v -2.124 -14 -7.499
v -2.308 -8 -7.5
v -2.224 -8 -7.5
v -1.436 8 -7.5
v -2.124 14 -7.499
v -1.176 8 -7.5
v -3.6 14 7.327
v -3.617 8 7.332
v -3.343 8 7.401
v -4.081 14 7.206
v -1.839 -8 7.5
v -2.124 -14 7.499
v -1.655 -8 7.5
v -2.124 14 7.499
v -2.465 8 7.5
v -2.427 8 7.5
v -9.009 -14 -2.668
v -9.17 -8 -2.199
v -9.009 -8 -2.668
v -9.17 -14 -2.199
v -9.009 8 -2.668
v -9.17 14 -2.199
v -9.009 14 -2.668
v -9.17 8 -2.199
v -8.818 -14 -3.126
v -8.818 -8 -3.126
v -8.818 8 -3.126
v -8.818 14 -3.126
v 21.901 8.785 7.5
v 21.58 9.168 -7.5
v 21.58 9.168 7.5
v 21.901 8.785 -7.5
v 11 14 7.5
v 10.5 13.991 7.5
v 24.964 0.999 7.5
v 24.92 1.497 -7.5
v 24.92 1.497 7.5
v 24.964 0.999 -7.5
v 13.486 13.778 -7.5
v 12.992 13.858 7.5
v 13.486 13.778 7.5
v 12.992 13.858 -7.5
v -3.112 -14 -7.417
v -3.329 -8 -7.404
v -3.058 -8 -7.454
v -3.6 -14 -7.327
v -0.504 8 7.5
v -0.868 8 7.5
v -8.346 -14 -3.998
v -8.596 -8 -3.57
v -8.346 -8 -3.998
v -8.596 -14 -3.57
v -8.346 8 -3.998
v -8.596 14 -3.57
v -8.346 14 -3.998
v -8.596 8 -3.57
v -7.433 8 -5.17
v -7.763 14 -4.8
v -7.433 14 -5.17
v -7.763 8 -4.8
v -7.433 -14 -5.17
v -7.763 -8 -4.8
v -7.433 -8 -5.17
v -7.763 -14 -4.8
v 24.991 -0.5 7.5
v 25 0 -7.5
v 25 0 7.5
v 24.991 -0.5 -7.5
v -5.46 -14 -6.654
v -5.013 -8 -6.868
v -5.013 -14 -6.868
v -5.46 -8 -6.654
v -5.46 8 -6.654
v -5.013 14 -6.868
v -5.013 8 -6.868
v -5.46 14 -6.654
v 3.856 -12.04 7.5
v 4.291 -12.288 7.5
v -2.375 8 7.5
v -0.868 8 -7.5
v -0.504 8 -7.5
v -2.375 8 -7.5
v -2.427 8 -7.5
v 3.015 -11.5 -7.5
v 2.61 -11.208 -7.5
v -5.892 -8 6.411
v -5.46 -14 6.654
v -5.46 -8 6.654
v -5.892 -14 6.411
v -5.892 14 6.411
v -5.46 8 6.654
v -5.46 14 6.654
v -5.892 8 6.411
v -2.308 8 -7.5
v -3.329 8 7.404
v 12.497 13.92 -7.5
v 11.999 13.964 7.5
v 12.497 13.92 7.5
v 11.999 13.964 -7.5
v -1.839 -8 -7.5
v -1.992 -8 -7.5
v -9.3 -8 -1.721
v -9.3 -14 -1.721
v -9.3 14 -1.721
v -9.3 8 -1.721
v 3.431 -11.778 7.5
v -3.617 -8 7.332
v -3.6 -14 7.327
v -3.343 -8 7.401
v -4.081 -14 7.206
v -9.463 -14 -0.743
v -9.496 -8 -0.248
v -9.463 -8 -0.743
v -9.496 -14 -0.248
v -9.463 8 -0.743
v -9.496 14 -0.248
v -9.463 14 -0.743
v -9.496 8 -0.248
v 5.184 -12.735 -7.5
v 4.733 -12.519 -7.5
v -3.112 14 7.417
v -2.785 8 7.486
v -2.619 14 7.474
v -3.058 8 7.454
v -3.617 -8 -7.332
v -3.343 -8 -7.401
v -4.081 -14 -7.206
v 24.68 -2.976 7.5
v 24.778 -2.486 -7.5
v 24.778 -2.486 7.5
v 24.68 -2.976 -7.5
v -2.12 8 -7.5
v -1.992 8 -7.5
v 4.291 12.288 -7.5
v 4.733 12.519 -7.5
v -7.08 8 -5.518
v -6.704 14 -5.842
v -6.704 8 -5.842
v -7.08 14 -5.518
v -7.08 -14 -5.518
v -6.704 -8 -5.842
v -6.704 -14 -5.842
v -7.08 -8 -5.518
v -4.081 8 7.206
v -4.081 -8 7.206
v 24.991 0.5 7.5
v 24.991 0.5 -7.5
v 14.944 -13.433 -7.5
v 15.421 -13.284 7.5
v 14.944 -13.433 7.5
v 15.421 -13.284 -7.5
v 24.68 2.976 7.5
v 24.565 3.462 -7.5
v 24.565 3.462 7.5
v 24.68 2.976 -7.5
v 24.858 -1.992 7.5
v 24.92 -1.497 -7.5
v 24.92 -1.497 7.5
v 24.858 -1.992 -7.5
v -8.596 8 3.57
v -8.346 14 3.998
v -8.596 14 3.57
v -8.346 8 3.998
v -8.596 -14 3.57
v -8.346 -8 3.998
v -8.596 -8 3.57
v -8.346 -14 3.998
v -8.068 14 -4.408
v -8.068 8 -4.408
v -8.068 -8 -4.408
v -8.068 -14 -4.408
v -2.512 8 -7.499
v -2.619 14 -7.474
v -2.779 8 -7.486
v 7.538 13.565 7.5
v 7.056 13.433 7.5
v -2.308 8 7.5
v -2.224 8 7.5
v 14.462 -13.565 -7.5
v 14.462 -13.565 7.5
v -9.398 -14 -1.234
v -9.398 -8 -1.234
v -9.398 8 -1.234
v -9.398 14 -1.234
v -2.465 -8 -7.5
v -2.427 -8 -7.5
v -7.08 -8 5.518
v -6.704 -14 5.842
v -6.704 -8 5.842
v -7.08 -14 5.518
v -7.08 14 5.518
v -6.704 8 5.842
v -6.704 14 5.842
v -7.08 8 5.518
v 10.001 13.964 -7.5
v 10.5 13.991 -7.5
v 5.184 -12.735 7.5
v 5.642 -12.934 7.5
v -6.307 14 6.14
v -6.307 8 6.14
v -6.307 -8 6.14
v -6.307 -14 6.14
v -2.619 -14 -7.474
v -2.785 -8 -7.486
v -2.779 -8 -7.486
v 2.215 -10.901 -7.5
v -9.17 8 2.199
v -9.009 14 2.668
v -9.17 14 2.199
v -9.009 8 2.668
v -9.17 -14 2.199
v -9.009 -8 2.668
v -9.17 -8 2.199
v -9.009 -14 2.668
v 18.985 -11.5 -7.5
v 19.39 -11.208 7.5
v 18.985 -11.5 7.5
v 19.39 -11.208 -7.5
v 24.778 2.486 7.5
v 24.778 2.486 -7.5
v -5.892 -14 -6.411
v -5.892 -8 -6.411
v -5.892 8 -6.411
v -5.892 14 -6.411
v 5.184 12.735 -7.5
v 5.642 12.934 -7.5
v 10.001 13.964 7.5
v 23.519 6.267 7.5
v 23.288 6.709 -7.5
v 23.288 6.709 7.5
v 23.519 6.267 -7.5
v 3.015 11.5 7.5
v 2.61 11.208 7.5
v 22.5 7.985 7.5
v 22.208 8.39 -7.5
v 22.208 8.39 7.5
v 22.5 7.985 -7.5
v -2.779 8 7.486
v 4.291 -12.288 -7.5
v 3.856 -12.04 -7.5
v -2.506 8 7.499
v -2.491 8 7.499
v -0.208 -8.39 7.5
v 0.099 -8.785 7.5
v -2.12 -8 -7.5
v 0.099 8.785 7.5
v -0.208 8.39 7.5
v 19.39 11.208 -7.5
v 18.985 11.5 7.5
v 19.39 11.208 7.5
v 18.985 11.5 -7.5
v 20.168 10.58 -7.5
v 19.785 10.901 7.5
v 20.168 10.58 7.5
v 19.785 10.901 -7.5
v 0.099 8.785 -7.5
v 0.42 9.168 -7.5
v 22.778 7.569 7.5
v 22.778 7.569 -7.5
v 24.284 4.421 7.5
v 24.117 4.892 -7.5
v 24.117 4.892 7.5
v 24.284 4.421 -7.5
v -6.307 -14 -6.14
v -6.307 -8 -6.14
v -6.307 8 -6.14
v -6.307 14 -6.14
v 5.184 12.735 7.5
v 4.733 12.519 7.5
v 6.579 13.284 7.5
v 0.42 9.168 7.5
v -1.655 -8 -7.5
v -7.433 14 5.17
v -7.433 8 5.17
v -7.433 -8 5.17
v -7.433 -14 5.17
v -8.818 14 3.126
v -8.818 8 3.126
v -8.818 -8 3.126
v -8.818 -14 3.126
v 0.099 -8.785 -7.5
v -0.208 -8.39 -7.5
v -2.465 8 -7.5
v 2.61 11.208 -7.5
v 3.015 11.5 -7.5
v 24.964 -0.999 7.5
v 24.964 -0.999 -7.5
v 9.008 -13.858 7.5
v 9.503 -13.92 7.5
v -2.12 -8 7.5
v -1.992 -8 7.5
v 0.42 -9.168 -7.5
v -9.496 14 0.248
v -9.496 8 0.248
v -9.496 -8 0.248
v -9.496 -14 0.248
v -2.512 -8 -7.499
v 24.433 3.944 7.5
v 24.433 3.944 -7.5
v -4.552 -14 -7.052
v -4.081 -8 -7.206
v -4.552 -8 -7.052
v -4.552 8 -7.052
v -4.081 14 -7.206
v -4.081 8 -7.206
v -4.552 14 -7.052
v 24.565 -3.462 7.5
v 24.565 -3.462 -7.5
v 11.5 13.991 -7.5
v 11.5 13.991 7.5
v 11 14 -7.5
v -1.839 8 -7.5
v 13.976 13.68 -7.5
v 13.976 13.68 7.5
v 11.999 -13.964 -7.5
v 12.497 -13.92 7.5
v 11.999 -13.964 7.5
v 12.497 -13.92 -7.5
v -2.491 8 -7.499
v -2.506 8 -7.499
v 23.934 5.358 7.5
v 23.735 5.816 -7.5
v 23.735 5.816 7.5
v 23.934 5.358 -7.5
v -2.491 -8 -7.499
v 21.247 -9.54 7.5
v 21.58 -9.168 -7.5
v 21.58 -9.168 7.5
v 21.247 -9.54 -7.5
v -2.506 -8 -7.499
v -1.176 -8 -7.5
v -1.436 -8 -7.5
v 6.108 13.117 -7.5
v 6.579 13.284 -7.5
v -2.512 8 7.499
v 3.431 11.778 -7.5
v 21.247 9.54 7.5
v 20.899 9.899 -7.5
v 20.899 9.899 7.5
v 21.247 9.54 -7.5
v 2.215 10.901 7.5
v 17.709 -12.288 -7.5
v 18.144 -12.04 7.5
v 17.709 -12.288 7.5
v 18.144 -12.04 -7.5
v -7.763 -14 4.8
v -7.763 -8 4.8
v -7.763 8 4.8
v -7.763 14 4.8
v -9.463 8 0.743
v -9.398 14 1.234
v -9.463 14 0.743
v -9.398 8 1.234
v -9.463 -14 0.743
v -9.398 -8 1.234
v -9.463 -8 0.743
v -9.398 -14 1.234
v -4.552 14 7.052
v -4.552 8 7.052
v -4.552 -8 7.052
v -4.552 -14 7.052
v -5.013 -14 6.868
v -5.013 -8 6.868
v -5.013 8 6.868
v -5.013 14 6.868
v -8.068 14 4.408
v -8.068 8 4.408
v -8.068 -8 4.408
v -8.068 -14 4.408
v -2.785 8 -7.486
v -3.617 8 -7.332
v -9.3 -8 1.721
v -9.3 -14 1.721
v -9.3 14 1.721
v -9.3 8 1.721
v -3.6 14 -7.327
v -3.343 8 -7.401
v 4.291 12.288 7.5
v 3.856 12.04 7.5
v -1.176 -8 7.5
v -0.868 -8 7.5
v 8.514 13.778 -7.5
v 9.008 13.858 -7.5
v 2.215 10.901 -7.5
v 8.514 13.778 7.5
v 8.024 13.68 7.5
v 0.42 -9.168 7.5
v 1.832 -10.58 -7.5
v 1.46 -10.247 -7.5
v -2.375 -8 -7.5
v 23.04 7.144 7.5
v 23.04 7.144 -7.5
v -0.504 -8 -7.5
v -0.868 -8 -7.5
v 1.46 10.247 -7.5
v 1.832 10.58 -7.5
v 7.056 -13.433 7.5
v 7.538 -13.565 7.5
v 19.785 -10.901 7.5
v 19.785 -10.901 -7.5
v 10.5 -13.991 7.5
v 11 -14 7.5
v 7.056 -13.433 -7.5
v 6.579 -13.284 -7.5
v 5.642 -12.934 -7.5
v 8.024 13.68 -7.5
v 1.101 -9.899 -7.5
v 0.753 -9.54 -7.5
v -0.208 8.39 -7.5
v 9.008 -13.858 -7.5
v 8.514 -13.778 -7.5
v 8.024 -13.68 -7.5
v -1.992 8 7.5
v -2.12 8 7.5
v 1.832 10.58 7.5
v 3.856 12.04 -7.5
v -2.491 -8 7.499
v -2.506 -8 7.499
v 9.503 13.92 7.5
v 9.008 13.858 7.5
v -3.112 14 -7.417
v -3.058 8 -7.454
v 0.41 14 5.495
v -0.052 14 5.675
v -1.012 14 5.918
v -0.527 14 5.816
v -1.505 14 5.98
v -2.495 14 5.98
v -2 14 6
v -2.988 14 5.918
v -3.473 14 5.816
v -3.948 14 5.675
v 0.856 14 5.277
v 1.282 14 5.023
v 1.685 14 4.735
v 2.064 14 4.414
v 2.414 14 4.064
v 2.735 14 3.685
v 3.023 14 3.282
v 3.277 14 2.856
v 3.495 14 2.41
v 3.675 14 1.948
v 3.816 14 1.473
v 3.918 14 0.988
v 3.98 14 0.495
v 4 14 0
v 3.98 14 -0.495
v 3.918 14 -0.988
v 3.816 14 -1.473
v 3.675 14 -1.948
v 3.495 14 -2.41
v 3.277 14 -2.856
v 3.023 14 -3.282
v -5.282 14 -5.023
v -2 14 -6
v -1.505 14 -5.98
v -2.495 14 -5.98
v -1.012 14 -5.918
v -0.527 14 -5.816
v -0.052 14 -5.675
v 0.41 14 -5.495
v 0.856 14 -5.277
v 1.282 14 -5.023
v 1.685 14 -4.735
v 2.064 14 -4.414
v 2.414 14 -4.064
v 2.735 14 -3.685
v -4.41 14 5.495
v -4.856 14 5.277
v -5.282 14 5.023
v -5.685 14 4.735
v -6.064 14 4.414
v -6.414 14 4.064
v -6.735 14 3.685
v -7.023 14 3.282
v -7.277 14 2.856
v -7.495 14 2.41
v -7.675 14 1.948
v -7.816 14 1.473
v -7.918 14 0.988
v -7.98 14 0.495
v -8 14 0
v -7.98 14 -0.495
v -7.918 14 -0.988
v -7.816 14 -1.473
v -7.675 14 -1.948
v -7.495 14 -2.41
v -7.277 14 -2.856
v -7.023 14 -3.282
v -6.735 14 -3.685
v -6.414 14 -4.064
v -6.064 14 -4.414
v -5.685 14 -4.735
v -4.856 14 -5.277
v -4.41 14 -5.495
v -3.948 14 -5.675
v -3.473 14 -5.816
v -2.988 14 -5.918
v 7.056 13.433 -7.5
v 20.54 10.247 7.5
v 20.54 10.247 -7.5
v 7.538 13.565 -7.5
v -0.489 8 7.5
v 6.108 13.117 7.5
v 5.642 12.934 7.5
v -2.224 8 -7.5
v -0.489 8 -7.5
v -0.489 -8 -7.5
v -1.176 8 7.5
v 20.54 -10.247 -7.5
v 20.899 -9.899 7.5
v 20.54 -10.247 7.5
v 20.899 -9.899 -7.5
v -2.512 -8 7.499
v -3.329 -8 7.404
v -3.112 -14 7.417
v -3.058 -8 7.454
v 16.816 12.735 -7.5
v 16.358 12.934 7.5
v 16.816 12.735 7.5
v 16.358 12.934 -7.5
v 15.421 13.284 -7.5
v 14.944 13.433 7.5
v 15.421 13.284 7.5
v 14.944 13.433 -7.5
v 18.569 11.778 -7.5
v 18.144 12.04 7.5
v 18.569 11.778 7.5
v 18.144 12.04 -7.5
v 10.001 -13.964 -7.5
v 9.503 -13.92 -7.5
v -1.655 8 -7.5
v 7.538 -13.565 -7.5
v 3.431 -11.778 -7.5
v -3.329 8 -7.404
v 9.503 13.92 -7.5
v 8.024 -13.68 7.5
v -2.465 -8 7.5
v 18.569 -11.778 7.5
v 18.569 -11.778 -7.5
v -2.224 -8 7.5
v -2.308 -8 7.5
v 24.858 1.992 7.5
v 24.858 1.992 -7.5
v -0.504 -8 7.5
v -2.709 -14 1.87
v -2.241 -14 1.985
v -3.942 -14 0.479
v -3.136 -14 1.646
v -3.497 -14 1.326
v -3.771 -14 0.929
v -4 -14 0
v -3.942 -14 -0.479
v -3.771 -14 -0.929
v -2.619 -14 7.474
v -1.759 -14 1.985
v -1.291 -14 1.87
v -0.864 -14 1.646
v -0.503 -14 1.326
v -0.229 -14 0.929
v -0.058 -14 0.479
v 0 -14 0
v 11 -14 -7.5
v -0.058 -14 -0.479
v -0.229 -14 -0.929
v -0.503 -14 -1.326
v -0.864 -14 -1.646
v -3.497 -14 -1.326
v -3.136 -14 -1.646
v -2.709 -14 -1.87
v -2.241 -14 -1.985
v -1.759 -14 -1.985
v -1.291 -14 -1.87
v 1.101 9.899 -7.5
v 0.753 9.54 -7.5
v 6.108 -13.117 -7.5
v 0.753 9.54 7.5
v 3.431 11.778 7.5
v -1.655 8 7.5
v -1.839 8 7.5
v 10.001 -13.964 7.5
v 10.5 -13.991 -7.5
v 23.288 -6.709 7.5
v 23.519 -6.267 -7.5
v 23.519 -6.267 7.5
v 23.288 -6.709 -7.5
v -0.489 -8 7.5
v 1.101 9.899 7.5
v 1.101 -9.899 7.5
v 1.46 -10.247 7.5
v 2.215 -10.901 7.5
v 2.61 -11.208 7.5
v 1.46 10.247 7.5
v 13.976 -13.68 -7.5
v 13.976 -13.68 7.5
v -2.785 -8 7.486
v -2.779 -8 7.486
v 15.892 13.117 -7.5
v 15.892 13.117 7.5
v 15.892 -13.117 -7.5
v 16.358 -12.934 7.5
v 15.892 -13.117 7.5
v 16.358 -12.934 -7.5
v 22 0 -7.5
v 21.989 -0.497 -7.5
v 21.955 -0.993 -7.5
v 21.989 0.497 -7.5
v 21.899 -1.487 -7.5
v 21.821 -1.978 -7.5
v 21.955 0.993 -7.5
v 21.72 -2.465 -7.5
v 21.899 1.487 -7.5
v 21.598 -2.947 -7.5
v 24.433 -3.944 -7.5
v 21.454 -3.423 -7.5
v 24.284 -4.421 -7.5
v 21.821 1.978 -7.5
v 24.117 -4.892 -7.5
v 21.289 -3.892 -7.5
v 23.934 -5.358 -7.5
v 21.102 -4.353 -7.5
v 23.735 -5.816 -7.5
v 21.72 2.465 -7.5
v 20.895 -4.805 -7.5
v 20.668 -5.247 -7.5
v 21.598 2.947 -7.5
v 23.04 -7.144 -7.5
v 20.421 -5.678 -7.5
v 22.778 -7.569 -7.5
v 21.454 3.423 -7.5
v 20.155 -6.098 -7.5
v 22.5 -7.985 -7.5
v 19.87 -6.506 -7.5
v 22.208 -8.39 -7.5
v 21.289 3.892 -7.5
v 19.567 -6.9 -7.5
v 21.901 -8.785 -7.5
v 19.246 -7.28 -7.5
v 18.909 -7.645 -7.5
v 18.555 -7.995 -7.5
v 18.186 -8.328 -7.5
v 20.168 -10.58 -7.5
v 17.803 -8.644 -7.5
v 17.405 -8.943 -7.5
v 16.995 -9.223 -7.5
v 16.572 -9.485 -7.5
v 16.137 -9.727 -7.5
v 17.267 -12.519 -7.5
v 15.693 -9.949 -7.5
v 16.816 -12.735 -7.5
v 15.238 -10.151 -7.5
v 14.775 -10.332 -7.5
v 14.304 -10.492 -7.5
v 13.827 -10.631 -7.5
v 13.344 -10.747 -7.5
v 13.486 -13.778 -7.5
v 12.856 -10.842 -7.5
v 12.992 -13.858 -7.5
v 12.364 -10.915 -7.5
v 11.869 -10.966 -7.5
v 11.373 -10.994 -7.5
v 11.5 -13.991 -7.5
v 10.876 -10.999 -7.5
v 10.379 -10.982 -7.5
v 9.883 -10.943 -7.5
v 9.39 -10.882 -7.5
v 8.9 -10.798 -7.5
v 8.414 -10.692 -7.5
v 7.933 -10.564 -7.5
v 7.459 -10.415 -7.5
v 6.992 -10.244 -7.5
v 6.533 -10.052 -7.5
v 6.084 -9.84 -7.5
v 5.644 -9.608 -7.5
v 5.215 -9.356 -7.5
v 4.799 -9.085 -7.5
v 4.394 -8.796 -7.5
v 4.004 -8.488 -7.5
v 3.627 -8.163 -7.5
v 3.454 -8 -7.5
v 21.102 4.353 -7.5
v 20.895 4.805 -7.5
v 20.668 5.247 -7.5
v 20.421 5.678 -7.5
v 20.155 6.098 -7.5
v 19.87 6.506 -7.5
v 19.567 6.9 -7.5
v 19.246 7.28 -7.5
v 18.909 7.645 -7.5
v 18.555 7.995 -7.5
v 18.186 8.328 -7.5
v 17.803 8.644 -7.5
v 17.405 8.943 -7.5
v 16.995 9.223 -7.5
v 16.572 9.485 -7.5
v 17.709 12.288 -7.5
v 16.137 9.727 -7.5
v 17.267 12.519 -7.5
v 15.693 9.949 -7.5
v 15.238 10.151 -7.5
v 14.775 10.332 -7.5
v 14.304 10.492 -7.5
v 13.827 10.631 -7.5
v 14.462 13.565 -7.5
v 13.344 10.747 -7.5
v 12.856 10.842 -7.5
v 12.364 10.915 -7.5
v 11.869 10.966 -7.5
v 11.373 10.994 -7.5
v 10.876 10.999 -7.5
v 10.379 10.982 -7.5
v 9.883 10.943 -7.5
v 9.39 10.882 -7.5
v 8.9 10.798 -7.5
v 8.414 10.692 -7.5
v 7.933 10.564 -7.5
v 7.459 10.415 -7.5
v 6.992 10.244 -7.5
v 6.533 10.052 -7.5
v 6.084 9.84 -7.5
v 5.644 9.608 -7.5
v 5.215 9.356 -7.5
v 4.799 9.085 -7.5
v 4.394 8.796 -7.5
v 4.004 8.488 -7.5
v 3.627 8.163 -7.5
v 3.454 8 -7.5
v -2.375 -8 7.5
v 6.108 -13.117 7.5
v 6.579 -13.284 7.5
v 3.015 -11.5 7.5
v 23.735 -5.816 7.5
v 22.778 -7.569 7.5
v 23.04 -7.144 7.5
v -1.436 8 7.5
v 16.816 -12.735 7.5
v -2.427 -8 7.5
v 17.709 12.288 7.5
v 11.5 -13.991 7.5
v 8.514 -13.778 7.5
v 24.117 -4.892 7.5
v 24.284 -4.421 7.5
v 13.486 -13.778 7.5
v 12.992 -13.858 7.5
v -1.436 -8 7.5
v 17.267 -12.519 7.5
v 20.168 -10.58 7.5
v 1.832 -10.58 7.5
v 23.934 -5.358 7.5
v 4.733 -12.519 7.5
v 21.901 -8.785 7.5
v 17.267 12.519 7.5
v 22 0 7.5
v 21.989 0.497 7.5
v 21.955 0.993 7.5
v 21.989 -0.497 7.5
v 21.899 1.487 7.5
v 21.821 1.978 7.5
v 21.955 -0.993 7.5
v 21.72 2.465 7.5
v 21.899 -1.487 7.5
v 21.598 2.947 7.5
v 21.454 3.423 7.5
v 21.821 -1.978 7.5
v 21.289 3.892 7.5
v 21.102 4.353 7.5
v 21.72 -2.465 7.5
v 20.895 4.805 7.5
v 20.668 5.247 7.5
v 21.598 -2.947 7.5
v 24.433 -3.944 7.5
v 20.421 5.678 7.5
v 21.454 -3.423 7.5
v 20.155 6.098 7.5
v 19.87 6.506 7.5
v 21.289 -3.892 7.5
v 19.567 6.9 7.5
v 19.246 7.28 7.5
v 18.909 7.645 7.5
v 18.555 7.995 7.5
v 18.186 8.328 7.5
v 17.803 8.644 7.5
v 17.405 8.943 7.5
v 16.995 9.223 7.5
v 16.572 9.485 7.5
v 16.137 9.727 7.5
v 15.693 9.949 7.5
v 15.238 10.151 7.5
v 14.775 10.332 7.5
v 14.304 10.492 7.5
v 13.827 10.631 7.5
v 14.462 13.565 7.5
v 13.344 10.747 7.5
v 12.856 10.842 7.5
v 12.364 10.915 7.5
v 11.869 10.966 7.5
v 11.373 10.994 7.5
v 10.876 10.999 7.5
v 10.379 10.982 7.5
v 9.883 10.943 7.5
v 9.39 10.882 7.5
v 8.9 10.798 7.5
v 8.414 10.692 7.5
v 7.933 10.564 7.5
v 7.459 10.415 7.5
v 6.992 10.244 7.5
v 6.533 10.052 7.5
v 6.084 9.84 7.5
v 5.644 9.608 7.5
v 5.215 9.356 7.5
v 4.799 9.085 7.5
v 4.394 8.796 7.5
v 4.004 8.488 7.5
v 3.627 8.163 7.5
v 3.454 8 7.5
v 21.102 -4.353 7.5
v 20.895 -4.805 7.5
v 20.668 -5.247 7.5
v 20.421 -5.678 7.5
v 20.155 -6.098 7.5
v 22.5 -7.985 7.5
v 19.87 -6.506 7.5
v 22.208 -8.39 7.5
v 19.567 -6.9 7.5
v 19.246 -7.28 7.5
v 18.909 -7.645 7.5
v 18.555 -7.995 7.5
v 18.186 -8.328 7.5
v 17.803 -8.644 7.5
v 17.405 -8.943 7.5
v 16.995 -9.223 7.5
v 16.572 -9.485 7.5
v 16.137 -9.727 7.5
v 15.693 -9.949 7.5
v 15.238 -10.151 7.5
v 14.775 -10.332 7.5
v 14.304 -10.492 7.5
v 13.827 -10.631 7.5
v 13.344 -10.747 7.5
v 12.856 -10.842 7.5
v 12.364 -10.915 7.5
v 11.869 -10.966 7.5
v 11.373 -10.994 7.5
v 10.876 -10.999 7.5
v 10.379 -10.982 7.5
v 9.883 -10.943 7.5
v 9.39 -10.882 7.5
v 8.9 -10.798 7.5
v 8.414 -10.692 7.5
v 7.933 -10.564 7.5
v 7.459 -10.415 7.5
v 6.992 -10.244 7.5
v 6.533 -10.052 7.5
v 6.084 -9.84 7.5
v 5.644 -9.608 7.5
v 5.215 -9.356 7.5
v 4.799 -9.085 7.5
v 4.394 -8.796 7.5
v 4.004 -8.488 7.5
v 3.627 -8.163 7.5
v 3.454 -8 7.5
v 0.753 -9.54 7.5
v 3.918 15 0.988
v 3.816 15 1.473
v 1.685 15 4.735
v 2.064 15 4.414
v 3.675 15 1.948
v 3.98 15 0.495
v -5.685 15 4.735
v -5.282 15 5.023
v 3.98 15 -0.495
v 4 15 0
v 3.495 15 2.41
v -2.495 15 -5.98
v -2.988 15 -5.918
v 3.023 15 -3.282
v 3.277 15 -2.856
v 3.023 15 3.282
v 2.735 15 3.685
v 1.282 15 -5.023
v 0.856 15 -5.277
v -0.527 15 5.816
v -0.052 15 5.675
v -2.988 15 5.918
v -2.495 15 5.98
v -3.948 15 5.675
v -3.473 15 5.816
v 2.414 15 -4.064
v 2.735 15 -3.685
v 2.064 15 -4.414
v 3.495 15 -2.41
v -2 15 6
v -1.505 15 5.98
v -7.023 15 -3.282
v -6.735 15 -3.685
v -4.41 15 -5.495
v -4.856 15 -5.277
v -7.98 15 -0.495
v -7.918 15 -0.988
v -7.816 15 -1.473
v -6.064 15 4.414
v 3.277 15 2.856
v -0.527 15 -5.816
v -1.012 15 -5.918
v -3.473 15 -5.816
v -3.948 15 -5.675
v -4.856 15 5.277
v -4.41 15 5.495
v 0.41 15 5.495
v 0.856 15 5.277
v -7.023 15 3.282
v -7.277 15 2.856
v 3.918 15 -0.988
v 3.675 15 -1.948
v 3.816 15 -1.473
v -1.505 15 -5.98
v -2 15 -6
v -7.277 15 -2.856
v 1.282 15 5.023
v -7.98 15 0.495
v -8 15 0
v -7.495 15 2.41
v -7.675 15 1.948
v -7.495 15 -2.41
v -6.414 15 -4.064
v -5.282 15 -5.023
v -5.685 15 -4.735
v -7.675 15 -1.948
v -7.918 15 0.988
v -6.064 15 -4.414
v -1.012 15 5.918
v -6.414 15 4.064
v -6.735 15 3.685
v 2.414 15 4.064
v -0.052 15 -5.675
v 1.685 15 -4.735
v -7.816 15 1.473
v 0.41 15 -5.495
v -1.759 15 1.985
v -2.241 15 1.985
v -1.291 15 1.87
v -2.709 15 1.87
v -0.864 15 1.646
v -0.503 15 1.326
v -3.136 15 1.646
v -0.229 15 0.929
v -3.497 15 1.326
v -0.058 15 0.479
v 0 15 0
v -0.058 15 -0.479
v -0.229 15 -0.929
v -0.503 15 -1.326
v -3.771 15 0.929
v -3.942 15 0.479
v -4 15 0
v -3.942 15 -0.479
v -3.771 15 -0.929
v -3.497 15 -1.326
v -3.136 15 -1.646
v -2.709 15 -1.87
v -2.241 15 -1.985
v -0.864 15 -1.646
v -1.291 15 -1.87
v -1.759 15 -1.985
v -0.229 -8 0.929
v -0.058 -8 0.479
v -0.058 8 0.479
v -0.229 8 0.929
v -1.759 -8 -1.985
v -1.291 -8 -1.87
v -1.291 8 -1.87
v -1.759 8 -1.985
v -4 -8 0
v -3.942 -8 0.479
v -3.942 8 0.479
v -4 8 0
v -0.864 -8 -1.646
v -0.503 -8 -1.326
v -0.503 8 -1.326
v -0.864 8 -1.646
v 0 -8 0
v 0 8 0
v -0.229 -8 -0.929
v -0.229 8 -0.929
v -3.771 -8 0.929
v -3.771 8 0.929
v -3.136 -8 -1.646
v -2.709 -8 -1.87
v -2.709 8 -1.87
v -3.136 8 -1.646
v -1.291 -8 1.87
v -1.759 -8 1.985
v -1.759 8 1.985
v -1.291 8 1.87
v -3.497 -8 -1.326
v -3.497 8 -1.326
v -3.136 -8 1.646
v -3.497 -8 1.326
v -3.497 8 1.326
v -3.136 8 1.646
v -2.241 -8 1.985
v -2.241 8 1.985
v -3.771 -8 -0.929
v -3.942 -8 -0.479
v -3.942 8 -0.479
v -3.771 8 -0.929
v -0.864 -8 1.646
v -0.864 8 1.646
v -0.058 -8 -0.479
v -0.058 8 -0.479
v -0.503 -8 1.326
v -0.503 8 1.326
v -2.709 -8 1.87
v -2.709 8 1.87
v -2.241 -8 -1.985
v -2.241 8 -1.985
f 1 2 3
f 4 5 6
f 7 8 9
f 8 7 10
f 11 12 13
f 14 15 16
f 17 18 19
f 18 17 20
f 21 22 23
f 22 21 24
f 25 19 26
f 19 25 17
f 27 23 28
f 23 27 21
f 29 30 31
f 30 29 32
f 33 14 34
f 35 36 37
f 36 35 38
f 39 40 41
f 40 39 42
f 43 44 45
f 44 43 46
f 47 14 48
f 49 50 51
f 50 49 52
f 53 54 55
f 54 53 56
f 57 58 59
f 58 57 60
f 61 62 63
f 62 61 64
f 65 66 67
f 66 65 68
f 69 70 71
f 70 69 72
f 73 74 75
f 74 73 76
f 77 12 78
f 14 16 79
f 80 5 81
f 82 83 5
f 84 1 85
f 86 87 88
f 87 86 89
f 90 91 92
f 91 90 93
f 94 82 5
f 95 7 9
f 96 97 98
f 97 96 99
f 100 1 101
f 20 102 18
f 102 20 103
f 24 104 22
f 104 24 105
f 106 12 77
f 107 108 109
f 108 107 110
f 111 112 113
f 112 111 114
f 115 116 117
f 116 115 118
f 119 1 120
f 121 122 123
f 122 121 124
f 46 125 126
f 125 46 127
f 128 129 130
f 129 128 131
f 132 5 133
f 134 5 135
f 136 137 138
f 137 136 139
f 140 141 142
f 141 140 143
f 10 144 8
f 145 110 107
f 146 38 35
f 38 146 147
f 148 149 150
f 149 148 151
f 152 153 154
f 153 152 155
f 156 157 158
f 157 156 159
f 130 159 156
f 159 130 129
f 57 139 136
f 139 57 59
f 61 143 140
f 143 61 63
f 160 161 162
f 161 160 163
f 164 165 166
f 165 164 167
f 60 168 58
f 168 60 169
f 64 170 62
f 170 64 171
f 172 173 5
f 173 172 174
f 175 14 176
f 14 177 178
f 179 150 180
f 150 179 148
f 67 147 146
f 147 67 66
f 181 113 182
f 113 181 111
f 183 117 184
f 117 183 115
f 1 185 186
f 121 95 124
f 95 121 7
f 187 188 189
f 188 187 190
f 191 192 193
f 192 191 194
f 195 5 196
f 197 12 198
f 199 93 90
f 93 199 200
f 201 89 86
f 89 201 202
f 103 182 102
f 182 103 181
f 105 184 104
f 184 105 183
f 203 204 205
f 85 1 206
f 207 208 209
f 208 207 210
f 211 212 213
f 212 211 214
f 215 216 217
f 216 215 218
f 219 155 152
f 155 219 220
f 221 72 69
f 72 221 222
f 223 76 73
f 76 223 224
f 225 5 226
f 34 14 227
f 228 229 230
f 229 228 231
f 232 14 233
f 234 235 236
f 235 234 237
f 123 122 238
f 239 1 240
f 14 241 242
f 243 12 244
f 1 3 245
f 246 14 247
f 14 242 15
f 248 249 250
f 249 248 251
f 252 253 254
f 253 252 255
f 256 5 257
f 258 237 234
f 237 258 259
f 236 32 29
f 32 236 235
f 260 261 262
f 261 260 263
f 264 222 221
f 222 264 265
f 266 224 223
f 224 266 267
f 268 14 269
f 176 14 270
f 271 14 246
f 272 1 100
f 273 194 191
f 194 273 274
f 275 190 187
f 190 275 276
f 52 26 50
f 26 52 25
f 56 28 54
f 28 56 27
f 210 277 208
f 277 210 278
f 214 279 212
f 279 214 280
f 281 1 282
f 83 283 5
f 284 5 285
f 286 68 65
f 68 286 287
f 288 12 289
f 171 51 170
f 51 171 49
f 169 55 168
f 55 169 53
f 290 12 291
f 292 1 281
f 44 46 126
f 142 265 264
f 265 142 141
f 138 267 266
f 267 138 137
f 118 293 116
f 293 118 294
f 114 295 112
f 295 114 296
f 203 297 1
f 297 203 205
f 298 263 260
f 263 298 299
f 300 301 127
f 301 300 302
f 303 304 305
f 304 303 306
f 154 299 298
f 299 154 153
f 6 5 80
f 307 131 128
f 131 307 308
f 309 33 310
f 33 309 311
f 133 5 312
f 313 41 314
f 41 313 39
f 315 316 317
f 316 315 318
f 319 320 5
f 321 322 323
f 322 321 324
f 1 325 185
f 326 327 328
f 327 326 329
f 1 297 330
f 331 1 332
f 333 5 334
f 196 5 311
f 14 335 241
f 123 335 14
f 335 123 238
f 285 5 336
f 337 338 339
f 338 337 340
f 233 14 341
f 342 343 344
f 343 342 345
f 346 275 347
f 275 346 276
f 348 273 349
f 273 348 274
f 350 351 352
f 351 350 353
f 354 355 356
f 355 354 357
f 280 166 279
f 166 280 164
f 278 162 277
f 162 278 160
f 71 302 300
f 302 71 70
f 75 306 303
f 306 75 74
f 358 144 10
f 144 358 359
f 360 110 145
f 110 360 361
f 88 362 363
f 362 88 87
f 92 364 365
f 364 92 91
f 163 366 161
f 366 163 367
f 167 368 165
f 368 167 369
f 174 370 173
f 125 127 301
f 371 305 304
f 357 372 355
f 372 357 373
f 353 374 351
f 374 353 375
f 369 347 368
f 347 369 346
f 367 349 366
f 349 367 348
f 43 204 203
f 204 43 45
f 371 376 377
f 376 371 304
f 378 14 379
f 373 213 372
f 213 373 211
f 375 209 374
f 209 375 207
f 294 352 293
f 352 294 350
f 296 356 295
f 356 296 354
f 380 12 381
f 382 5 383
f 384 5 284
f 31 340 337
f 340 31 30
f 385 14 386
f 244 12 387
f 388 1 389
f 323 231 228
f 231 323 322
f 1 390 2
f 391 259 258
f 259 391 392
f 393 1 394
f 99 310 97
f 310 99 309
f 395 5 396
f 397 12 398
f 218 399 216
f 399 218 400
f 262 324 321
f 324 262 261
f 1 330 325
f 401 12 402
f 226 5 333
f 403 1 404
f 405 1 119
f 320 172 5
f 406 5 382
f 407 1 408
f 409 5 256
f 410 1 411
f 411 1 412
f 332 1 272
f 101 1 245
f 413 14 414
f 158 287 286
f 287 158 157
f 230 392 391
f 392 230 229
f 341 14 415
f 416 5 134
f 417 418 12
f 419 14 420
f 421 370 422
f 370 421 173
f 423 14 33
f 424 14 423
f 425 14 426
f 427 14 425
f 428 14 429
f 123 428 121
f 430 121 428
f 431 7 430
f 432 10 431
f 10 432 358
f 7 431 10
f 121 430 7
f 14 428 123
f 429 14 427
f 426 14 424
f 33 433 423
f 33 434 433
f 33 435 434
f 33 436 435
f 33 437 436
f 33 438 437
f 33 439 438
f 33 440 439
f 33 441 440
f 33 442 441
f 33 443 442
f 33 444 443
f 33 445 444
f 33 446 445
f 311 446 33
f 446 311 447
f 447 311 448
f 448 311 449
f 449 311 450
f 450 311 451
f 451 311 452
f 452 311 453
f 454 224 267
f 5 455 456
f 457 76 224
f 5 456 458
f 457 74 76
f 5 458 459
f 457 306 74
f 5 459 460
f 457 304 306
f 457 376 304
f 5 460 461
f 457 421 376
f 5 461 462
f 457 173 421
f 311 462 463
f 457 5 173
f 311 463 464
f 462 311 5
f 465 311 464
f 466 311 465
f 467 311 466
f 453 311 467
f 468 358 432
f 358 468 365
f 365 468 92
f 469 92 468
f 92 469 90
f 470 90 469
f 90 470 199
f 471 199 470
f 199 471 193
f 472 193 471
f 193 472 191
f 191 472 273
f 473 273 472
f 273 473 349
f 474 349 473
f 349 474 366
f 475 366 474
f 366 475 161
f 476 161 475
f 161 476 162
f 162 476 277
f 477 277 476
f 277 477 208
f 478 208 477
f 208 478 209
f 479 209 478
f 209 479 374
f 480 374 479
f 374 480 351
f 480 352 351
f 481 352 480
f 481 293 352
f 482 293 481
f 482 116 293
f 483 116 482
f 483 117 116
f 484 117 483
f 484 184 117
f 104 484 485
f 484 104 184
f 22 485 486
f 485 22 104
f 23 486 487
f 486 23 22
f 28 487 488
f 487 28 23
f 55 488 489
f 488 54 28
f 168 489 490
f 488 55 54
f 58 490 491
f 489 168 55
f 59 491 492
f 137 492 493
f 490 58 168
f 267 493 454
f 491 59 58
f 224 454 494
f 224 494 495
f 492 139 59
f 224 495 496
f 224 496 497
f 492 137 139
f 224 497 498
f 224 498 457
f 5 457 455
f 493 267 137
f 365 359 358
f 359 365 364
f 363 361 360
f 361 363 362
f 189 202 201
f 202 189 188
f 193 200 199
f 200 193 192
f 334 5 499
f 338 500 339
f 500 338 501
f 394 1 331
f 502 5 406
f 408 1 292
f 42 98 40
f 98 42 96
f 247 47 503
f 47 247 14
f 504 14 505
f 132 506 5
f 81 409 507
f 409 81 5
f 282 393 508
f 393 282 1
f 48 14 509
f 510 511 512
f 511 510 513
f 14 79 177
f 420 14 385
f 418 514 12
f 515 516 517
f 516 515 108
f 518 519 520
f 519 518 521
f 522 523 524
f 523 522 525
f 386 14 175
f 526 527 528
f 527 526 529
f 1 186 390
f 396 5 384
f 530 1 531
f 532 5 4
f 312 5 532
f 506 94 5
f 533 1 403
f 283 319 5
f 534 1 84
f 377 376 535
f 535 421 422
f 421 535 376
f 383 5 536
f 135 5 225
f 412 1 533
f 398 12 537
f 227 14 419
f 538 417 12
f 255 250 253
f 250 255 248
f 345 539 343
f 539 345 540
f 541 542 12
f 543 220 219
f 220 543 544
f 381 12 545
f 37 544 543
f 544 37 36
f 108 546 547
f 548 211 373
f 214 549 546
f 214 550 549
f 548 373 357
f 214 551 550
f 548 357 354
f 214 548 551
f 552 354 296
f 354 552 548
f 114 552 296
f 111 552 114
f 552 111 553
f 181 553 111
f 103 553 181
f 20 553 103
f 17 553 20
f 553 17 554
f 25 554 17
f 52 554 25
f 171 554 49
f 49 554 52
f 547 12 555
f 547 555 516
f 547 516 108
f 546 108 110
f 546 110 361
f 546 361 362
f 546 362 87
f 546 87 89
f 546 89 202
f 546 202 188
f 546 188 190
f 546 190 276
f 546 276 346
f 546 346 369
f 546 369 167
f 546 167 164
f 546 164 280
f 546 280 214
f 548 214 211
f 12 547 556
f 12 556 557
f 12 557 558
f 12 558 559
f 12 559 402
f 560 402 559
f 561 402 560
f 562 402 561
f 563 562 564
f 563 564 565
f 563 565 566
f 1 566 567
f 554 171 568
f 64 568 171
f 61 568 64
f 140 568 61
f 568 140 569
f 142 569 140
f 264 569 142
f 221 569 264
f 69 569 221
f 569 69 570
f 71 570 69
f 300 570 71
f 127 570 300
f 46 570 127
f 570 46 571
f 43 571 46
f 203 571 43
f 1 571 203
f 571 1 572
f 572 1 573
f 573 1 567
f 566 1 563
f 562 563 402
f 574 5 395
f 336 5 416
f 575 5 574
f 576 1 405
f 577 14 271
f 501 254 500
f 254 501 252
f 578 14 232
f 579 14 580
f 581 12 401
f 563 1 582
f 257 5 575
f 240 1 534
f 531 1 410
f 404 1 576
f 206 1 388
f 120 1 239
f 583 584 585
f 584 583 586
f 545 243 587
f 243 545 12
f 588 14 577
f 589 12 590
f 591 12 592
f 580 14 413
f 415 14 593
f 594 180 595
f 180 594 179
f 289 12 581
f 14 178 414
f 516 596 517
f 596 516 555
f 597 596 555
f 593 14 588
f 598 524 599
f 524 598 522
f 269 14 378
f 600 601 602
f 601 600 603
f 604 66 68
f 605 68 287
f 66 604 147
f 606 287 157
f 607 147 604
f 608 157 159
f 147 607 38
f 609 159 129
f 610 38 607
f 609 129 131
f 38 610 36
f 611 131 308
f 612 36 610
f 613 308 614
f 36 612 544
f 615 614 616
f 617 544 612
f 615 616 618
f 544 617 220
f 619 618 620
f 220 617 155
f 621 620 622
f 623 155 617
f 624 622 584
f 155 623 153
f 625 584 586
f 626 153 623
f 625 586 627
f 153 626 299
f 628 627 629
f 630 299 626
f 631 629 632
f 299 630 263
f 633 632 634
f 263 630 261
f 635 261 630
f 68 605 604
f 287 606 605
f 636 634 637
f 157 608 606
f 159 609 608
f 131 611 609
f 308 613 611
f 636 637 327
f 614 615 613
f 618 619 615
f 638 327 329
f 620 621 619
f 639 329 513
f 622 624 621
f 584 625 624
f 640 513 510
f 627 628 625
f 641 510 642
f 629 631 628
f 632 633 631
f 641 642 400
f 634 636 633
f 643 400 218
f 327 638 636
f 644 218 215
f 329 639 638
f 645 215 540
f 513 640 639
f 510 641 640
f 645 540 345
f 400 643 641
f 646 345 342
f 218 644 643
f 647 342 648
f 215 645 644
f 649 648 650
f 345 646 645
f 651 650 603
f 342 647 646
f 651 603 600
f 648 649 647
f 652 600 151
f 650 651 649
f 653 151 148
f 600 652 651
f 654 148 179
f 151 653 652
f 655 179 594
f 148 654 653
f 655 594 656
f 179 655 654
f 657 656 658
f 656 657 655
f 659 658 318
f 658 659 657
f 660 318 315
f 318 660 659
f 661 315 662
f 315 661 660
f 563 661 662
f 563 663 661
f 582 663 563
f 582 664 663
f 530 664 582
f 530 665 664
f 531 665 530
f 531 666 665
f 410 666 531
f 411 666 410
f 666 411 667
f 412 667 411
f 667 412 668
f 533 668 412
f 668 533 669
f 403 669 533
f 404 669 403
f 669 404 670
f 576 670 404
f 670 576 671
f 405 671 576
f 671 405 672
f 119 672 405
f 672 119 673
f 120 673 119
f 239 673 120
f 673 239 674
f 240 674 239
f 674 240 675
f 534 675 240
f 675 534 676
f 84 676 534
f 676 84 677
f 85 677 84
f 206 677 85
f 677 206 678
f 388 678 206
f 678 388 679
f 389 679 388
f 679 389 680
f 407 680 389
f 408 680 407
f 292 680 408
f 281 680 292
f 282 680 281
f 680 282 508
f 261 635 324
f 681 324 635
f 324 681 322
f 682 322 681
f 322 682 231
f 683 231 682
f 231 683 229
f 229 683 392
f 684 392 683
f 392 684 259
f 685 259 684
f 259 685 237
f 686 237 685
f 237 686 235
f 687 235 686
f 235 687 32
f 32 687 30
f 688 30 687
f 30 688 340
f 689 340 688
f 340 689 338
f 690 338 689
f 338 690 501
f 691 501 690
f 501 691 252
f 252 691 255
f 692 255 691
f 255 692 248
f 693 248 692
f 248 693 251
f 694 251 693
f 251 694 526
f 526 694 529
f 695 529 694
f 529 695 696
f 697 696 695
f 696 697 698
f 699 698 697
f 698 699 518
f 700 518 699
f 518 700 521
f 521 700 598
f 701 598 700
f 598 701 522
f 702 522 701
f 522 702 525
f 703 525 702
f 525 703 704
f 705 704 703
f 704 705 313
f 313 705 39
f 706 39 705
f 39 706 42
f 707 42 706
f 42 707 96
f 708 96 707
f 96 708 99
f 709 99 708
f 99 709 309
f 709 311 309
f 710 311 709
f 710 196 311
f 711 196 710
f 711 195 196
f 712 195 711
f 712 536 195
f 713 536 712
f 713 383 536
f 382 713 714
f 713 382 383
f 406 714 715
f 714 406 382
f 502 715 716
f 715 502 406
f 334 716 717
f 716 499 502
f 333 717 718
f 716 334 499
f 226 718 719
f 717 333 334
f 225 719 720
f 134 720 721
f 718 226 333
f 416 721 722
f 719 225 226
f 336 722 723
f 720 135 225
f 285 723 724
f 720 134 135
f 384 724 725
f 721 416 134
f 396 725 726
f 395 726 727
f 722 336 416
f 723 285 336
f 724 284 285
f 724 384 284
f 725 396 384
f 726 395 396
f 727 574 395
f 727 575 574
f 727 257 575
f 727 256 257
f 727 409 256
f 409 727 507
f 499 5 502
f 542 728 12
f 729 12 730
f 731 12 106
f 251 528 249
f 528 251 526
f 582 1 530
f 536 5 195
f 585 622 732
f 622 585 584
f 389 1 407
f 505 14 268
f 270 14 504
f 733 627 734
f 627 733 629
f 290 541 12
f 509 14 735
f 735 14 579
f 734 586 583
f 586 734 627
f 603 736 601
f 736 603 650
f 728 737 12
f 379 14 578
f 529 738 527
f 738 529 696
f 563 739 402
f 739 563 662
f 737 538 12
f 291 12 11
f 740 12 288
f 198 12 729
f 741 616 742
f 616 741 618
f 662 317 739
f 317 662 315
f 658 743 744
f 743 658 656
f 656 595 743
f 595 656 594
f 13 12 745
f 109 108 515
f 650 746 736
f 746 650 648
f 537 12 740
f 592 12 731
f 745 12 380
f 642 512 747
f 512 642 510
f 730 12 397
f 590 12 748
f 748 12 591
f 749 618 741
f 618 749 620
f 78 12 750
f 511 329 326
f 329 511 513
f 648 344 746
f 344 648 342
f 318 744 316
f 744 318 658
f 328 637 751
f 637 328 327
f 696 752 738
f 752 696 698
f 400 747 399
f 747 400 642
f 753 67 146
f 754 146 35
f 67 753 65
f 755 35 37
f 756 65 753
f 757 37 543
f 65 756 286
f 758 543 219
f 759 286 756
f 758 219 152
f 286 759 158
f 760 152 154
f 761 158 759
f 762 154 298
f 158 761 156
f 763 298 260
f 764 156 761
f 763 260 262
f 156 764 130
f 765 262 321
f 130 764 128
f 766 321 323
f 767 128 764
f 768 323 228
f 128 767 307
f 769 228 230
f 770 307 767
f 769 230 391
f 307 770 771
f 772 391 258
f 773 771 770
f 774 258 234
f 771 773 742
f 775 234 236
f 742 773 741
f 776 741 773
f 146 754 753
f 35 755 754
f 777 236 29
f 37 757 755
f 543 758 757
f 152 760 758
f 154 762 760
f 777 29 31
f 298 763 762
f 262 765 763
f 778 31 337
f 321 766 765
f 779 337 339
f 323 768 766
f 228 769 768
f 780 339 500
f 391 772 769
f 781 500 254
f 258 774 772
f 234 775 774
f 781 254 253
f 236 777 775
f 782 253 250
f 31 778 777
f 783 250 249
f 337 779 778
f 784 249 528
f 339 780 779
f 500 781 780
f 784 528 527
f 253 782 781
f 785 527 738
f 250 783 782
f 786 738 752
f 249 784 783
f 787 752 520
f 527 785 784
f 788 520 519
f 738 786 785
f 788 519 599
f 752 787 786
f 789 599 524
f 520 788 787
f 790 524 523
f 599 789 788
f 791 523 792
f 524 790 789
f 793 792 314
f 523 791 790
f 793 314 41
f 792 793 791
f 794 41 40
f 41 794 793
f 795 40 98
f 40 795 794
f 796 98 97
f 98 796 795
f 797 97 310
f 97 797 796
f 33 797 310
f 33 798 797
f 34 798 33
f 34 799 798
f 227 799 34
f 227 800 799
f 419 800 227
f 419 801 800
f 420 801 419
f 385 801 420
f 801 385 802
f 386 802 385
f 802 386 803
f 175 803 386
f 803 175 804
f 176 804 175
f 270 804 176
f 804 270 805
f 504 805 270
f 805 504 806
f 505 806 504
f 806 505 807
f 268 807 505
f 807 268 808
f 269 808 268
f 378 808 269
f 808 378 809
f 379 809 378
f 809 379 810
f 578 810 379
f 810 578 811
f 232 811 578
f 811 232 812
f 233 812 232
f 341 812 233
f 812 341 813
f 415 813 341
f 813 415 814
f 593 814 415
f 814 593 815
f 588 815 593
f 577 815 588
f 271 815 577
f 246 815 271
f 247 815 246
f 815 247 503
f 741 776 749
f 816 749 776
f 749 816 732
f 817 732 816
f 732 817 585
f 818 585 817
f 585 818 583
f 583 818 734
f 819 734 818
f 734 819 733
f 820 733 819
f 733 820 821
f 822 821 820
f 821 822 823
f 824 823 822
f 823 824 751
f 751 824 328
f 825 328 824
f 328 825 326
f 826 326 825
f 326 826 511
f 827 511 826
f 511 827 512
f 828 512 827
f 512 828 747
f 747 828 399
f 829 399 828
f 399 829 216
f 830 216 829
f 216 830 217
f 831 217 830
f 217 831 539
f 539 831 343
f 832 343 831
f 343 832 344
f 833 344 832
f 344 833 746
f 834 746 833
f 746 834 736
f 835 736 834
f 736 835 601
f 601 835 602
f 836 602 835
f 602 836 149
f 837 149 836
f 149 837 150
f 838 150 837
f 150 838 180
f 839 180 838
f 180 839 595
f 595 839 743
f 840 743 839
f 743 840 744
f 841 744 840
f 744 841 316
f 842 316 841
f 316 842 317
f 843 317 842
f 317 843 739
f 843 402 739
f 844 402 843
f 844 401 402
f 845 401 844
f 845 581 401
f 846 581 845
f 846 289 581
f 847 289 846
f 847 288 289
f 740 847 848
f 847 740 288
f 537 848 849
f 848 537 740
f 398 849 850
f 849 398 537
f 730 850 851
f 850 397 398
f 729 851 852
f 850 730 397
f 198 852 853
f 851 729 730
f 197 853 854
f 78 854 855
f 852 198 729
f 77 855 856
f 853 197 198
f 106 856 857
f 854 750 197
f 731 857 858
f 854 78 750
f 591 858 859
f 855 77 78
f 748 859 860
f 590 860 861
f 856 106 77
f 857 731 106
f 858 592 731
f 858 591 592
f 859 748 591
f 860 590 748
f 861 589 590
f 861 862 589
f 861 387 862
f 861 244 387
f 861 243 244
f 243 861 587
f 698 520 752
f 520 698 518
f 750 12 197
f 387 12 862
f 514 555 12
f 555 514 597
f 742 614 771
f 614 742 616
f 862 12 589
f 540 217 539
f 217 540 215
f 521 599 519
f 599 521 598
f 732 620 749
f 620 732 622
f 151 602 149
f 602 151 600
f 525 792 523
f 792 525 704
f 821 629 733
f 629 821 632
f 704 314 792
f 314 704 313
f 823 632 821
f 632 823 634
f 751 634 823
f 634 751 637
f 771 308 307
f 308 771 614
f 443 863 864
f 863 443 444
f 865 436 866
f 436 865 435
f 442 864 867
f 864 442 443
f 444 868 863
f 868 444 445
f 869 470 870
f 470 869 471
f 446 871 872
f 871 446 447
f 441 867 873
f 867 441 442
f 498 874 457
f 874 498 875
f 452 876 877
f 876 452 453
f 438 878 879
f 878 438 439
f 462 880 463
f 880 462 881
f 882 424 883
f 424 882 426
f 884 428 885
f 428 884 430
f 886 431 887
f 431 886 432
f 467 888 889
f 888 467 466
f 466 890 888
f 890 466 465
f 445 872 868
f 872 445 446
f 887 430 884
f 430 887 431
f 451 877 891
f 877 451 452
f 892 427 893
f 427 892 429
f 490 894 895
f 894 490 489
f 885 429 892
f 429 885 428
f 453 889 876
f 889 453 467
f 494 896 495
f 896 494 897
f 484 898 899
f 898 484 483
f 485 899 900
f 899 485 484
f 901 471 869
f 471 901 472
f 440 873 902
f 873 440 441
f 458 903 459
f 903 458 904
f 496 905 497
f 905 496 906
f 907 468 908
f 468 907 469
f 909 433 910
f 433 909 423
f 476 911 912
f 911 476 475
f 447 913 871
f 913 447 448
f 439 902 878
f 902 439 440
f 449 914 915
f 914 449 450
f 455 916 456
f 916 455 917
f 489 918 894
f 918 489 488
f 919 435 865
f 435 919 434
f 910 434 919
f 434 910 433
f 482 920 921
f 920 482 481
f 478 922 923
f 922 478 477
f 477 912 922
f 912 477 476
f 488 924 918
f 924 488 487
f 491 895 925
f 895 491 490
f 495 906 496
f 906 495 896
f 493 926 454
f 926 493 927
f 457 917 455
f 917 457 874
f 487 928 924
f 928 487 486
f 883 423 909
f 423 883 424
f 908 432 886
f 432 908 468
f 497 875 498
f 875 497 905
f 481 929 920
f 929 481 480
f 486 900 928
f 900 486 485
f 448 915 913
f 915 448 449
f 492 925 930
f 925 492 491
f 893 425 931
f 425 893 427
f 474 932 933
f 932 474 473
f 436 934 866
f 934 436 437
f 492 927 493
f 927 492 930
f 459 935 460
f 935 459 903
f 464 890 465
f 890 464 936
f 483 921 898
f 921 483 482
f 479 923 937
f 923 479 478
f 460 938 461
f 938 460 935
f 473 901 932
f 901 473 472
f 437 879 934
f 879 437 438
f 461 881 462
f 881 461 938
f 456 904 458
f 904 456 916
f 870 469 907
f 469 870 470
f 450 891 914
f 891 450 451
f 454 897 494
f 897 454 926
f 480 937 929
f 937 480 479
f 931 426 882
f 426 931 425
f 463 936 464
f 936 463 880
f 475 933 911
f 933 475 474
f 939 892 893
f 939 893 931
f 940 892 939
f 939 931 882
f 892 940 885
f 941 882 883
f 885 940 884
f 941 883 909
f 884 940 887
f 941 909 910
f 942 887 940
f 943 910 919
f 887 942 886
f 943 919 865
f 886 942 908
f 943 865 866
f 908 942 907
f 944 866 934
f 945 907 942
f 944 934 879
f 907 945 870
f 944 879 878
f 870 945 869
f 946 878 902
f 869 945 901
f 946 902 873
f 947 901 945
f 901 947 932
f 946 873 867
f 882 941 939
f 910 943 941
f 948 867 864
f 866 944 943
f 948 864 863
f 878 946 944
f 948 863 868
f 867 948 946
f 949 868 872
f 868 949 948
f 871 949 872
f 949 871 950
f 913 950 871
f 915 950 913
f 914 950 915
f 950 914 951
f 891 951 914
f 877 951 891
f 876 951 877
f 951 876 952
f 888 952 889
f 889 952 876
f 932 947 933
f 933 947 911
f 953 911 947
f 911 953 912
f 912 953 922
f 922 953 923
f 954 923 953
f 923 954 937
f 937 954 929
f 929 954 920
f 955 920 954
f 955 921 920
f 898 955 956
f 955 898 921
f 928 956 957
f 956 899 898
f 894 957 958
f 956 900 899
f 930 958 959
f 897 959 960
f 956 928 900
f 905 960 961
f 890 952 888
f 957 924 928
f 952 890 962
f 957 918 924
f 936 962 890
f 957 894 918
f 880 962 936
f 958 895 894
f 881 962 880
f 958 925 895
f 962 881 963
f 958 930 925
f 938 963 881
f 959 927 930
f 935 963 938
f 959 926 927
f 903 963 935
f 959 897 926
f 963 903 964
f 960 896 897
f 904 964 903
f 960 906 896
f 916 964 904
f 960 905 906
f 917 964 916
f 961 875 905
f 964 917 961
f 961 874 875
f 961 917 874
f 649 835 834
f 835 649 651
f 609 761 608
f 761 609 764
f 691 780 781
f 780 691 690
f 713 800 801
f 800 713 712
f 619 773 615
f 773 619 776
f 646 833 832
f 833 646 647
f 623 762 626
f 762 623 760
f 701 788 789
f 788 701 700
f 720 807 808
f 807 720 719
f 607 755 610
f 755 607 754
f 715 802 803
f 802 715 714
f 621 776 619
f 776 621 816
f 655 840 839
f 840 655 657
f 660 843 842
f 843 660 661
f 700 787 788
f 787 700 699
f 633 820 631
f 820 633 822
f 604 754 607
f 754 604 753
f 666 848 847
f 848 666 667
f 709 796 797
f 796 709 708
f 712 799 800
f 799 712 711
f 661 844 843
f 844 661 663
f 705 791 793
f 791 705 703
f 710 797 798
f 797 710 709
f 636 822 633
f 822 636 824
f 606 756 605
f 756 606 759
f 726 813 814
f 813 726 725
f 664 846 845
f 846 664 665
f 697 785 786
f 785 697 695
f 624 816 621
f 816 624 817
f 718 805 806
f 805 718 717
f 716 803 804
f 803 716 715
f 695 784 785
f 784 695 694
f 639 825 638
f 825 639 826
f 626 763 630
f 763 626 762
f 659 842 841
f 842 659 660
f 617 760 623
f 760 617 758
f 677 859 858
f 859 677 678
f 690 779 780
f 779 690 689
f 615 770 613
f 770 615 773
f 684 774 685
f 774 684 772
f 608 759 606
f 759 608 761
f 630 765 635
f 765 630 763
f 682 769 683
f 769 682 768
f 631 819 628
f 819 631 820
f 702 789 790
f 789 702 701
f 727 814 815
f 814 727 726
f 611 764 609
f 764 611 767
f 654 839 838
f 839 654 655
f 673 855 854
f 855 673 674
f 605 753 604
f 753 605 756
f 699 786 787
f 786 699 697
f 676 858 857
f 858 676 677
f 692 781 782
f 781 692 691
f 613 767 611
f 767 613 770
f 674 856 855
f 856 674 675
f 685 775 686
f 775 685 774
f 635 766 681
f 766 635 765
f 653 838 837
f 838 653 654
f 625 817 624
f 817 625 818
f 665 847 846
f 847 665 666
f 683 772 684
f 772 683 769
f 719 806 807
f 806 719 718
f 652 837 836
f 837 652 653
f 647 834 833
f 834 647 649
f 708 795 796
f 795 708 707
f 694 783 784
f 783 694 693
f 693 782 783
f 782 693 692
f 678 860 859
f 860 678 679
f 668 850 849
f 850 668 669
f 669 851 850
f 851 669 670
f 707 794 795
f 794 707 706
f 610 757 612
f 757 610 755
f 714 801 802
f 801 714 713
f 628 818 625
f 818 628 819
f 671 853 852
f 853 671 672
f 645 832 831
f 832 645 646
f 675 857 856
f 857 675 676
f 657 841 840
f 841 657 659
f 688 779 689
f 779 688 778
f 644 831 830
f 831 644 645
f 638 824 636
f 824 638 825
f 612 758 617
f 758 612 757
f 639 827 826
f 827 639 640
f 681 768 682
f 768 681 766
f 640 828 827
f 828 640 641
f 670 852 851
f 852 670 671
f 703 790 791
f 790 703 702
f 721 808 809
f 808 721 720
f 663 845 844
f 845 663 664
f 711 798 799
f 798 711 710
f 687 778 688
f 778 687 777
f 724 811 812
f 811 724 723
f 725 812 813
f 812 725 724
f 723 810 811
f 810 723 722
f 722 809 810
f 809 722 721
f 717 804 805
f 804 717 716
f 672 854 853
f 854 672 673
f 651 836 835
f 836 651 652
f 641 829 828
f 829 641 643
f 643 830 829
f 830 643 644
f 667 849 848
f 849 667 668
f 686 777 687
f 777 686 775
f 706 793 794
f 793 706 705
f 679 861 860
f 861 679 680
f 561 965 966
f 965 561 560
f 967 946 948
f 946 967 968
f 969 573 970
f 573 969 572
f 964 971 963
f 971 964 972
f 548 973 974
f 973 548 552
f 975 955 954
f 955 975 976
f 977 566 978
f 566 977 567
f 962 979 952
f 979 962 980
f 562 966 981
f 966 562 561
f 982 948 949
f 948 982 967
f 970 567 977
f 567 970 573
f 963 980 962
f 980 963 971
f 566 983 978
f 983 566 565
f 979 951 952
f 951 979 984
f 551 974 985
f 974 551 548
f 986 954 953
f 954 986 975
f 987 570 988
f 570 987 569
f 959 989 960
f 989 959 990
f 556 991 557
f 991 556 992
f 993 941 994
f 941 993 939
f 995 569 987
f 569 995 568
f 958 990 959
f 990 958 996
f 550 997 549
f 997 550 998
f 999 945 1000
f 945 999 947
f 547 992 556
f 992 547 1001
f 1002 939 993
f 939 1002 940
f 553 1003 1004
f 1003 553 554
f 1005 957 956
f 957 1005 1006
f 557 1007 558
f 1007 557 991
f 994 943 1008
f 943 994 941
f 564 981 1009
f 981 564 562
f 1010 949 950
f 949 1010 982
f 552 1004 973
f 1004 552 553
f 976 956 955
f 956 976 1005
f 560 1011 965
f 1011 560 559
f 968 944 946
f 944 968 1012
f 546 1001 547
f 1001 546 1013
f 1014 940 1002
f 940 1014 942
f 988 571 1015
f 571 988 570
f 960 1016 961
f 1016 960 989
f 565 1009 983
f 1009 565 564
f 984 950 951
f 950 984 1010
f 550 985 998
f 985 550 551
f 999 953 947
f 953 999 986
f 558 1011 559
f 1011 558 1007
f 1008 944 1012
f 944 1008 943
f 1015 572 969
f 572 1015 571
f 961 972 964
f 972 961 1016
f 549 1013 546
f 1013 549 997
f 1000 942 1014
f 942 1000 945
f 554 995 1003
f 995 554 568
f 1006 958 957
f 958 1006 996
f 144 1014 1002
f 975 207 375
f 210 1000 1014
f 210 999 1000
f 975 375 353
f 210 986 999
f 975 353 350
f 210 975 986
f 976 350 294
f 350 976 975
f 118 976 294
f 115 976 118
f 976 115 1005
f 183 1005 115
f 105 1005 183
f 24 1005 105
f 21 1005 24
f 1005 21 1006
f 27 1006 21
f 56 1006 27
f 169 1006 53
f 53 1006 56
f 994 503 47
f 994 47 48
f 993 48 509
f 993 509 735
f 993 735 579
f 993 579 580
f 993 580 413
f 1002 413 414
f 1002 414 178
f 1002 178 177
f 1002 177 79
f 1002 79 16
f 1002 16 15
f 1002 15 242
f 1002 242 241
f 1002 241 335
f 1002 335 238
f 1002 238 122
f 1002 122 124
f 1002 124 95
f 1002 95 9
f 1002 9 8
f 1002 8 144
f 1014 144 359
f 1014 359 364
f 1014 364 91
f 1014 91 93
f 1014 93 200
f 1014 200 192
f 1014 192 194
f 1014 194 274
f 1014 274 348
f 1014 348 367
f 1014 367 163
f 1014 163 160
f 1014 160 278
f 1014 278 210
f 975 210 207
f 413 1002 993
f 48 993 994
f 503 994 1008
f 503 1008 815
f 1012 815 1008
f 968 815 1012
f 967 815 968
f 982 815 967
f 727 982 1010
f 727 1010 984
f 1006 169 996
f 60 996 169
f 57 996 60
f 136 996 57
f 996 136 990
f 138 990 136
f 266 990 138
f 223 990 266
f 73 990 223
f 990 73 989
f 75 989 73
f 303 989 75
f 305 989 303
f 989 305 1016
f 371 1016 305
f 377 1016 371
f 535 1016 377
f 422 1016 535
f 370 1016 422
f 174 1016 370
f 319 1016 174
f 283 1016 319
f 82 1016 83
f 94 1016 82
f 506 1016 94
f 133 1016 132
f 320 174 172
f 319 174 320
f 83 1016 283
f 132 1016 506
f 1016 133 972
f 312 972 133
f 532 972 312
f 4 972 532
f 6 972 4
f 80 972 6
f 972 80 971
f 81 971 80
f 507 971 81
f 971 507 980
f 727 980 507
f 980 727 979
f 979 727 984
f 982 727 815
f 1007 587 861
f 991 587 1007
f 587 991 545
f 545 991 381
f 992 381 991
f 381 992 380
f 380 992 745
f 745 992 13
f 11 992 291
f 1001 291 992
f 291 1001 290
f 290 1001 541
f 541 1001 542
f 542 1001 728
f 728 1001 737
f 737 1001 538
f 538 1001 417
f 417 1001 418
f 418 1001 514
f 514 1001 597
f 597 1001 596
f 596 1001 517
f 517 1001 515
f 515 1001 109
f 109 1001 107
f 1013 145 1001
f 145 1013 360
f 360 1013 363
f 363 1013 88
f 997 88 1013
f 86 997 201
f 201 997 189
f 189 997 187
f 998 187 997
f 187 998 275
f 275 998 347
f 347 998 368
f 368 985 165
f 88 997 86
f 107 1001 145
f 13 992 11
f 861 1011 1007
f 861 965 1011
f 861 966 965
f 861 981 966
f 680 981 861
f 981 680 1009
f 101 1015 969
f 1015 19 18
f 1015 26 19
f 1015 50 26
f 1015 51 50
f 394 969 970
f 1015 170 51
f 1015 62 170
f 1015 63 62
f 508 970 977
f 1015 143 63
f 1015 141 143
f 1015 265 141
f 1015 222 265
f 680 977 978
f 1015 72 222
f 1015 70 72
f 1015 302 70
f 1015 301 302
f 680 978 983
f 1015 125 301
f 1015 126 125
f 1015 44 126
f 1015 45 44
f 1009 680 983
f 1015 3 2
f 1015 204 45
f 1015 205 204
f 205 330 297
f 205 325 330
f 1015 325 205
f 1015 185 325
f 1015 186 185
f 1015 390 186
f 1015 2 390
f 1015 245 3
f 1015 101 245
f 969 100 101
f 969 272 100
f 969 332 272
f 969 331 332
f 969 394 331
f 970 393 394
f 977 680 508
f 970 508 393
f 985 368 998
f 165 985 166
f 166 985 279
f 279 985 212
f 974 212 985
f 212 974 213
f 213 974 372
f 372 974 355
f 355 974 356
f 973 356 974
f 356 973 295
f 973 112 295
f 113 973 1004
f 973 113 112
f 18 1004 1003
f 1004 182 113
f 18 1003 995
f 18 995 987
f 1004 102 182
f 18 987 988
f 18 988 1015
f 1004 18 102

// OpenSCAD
$fa=1/1;
$fs=0.5/1;
d_tube=22;
h_ring=15;
d_bolt=4;
d_nut=8;
wall=3;
bissl=0.01;
offset=0;
nut=false;
h_coupling=1;
d_coupling=12;
difference() {
  union() {
    hull() {
      translate([d_tube/2,0,0])cylinder(h=h_ring, d=d_tube+2*wall,center=true);
      translate([-d_bolt/2-offset,0,0]) rotate([90,0,0]) cylinder(h=d_tube+2*wall, d=h_ring,center=true);
    }
    translate([-d_bolt/2-offset,d_tube/2+wall+h_coupling,0]) rotate([90,0,0]) cylinder(h=h_coupling, d=d_coupling);
  }
  translate([d_tube/2,0,0])cylinder(h=d_tube+2*wall+bissl, d=d_tube,center=true);
if (nut) translate([-d_bolt/2-offset,-d_tube/2,0]) rotate([90,0,0]) cylinder(h=d_tube+2*wall+bissl, d=d_nut,$fn=6);
  translate([-d_bolt/2-offset,0,0]) rotate([90,0,0]) cylinder(h=d_tube+2*wall+2*h_coupling+bissl, d=d_bolt,center=true);
  translate([-d_bolt/2-h_ring/2-bissl-offset,-d_tube/2+wall,-h_ring/2-bissl])cube([d_bolt/2+h_ring/2+d_tube/2+offset,d_tube-2*wall,h_ring+2*bissl]);
}
